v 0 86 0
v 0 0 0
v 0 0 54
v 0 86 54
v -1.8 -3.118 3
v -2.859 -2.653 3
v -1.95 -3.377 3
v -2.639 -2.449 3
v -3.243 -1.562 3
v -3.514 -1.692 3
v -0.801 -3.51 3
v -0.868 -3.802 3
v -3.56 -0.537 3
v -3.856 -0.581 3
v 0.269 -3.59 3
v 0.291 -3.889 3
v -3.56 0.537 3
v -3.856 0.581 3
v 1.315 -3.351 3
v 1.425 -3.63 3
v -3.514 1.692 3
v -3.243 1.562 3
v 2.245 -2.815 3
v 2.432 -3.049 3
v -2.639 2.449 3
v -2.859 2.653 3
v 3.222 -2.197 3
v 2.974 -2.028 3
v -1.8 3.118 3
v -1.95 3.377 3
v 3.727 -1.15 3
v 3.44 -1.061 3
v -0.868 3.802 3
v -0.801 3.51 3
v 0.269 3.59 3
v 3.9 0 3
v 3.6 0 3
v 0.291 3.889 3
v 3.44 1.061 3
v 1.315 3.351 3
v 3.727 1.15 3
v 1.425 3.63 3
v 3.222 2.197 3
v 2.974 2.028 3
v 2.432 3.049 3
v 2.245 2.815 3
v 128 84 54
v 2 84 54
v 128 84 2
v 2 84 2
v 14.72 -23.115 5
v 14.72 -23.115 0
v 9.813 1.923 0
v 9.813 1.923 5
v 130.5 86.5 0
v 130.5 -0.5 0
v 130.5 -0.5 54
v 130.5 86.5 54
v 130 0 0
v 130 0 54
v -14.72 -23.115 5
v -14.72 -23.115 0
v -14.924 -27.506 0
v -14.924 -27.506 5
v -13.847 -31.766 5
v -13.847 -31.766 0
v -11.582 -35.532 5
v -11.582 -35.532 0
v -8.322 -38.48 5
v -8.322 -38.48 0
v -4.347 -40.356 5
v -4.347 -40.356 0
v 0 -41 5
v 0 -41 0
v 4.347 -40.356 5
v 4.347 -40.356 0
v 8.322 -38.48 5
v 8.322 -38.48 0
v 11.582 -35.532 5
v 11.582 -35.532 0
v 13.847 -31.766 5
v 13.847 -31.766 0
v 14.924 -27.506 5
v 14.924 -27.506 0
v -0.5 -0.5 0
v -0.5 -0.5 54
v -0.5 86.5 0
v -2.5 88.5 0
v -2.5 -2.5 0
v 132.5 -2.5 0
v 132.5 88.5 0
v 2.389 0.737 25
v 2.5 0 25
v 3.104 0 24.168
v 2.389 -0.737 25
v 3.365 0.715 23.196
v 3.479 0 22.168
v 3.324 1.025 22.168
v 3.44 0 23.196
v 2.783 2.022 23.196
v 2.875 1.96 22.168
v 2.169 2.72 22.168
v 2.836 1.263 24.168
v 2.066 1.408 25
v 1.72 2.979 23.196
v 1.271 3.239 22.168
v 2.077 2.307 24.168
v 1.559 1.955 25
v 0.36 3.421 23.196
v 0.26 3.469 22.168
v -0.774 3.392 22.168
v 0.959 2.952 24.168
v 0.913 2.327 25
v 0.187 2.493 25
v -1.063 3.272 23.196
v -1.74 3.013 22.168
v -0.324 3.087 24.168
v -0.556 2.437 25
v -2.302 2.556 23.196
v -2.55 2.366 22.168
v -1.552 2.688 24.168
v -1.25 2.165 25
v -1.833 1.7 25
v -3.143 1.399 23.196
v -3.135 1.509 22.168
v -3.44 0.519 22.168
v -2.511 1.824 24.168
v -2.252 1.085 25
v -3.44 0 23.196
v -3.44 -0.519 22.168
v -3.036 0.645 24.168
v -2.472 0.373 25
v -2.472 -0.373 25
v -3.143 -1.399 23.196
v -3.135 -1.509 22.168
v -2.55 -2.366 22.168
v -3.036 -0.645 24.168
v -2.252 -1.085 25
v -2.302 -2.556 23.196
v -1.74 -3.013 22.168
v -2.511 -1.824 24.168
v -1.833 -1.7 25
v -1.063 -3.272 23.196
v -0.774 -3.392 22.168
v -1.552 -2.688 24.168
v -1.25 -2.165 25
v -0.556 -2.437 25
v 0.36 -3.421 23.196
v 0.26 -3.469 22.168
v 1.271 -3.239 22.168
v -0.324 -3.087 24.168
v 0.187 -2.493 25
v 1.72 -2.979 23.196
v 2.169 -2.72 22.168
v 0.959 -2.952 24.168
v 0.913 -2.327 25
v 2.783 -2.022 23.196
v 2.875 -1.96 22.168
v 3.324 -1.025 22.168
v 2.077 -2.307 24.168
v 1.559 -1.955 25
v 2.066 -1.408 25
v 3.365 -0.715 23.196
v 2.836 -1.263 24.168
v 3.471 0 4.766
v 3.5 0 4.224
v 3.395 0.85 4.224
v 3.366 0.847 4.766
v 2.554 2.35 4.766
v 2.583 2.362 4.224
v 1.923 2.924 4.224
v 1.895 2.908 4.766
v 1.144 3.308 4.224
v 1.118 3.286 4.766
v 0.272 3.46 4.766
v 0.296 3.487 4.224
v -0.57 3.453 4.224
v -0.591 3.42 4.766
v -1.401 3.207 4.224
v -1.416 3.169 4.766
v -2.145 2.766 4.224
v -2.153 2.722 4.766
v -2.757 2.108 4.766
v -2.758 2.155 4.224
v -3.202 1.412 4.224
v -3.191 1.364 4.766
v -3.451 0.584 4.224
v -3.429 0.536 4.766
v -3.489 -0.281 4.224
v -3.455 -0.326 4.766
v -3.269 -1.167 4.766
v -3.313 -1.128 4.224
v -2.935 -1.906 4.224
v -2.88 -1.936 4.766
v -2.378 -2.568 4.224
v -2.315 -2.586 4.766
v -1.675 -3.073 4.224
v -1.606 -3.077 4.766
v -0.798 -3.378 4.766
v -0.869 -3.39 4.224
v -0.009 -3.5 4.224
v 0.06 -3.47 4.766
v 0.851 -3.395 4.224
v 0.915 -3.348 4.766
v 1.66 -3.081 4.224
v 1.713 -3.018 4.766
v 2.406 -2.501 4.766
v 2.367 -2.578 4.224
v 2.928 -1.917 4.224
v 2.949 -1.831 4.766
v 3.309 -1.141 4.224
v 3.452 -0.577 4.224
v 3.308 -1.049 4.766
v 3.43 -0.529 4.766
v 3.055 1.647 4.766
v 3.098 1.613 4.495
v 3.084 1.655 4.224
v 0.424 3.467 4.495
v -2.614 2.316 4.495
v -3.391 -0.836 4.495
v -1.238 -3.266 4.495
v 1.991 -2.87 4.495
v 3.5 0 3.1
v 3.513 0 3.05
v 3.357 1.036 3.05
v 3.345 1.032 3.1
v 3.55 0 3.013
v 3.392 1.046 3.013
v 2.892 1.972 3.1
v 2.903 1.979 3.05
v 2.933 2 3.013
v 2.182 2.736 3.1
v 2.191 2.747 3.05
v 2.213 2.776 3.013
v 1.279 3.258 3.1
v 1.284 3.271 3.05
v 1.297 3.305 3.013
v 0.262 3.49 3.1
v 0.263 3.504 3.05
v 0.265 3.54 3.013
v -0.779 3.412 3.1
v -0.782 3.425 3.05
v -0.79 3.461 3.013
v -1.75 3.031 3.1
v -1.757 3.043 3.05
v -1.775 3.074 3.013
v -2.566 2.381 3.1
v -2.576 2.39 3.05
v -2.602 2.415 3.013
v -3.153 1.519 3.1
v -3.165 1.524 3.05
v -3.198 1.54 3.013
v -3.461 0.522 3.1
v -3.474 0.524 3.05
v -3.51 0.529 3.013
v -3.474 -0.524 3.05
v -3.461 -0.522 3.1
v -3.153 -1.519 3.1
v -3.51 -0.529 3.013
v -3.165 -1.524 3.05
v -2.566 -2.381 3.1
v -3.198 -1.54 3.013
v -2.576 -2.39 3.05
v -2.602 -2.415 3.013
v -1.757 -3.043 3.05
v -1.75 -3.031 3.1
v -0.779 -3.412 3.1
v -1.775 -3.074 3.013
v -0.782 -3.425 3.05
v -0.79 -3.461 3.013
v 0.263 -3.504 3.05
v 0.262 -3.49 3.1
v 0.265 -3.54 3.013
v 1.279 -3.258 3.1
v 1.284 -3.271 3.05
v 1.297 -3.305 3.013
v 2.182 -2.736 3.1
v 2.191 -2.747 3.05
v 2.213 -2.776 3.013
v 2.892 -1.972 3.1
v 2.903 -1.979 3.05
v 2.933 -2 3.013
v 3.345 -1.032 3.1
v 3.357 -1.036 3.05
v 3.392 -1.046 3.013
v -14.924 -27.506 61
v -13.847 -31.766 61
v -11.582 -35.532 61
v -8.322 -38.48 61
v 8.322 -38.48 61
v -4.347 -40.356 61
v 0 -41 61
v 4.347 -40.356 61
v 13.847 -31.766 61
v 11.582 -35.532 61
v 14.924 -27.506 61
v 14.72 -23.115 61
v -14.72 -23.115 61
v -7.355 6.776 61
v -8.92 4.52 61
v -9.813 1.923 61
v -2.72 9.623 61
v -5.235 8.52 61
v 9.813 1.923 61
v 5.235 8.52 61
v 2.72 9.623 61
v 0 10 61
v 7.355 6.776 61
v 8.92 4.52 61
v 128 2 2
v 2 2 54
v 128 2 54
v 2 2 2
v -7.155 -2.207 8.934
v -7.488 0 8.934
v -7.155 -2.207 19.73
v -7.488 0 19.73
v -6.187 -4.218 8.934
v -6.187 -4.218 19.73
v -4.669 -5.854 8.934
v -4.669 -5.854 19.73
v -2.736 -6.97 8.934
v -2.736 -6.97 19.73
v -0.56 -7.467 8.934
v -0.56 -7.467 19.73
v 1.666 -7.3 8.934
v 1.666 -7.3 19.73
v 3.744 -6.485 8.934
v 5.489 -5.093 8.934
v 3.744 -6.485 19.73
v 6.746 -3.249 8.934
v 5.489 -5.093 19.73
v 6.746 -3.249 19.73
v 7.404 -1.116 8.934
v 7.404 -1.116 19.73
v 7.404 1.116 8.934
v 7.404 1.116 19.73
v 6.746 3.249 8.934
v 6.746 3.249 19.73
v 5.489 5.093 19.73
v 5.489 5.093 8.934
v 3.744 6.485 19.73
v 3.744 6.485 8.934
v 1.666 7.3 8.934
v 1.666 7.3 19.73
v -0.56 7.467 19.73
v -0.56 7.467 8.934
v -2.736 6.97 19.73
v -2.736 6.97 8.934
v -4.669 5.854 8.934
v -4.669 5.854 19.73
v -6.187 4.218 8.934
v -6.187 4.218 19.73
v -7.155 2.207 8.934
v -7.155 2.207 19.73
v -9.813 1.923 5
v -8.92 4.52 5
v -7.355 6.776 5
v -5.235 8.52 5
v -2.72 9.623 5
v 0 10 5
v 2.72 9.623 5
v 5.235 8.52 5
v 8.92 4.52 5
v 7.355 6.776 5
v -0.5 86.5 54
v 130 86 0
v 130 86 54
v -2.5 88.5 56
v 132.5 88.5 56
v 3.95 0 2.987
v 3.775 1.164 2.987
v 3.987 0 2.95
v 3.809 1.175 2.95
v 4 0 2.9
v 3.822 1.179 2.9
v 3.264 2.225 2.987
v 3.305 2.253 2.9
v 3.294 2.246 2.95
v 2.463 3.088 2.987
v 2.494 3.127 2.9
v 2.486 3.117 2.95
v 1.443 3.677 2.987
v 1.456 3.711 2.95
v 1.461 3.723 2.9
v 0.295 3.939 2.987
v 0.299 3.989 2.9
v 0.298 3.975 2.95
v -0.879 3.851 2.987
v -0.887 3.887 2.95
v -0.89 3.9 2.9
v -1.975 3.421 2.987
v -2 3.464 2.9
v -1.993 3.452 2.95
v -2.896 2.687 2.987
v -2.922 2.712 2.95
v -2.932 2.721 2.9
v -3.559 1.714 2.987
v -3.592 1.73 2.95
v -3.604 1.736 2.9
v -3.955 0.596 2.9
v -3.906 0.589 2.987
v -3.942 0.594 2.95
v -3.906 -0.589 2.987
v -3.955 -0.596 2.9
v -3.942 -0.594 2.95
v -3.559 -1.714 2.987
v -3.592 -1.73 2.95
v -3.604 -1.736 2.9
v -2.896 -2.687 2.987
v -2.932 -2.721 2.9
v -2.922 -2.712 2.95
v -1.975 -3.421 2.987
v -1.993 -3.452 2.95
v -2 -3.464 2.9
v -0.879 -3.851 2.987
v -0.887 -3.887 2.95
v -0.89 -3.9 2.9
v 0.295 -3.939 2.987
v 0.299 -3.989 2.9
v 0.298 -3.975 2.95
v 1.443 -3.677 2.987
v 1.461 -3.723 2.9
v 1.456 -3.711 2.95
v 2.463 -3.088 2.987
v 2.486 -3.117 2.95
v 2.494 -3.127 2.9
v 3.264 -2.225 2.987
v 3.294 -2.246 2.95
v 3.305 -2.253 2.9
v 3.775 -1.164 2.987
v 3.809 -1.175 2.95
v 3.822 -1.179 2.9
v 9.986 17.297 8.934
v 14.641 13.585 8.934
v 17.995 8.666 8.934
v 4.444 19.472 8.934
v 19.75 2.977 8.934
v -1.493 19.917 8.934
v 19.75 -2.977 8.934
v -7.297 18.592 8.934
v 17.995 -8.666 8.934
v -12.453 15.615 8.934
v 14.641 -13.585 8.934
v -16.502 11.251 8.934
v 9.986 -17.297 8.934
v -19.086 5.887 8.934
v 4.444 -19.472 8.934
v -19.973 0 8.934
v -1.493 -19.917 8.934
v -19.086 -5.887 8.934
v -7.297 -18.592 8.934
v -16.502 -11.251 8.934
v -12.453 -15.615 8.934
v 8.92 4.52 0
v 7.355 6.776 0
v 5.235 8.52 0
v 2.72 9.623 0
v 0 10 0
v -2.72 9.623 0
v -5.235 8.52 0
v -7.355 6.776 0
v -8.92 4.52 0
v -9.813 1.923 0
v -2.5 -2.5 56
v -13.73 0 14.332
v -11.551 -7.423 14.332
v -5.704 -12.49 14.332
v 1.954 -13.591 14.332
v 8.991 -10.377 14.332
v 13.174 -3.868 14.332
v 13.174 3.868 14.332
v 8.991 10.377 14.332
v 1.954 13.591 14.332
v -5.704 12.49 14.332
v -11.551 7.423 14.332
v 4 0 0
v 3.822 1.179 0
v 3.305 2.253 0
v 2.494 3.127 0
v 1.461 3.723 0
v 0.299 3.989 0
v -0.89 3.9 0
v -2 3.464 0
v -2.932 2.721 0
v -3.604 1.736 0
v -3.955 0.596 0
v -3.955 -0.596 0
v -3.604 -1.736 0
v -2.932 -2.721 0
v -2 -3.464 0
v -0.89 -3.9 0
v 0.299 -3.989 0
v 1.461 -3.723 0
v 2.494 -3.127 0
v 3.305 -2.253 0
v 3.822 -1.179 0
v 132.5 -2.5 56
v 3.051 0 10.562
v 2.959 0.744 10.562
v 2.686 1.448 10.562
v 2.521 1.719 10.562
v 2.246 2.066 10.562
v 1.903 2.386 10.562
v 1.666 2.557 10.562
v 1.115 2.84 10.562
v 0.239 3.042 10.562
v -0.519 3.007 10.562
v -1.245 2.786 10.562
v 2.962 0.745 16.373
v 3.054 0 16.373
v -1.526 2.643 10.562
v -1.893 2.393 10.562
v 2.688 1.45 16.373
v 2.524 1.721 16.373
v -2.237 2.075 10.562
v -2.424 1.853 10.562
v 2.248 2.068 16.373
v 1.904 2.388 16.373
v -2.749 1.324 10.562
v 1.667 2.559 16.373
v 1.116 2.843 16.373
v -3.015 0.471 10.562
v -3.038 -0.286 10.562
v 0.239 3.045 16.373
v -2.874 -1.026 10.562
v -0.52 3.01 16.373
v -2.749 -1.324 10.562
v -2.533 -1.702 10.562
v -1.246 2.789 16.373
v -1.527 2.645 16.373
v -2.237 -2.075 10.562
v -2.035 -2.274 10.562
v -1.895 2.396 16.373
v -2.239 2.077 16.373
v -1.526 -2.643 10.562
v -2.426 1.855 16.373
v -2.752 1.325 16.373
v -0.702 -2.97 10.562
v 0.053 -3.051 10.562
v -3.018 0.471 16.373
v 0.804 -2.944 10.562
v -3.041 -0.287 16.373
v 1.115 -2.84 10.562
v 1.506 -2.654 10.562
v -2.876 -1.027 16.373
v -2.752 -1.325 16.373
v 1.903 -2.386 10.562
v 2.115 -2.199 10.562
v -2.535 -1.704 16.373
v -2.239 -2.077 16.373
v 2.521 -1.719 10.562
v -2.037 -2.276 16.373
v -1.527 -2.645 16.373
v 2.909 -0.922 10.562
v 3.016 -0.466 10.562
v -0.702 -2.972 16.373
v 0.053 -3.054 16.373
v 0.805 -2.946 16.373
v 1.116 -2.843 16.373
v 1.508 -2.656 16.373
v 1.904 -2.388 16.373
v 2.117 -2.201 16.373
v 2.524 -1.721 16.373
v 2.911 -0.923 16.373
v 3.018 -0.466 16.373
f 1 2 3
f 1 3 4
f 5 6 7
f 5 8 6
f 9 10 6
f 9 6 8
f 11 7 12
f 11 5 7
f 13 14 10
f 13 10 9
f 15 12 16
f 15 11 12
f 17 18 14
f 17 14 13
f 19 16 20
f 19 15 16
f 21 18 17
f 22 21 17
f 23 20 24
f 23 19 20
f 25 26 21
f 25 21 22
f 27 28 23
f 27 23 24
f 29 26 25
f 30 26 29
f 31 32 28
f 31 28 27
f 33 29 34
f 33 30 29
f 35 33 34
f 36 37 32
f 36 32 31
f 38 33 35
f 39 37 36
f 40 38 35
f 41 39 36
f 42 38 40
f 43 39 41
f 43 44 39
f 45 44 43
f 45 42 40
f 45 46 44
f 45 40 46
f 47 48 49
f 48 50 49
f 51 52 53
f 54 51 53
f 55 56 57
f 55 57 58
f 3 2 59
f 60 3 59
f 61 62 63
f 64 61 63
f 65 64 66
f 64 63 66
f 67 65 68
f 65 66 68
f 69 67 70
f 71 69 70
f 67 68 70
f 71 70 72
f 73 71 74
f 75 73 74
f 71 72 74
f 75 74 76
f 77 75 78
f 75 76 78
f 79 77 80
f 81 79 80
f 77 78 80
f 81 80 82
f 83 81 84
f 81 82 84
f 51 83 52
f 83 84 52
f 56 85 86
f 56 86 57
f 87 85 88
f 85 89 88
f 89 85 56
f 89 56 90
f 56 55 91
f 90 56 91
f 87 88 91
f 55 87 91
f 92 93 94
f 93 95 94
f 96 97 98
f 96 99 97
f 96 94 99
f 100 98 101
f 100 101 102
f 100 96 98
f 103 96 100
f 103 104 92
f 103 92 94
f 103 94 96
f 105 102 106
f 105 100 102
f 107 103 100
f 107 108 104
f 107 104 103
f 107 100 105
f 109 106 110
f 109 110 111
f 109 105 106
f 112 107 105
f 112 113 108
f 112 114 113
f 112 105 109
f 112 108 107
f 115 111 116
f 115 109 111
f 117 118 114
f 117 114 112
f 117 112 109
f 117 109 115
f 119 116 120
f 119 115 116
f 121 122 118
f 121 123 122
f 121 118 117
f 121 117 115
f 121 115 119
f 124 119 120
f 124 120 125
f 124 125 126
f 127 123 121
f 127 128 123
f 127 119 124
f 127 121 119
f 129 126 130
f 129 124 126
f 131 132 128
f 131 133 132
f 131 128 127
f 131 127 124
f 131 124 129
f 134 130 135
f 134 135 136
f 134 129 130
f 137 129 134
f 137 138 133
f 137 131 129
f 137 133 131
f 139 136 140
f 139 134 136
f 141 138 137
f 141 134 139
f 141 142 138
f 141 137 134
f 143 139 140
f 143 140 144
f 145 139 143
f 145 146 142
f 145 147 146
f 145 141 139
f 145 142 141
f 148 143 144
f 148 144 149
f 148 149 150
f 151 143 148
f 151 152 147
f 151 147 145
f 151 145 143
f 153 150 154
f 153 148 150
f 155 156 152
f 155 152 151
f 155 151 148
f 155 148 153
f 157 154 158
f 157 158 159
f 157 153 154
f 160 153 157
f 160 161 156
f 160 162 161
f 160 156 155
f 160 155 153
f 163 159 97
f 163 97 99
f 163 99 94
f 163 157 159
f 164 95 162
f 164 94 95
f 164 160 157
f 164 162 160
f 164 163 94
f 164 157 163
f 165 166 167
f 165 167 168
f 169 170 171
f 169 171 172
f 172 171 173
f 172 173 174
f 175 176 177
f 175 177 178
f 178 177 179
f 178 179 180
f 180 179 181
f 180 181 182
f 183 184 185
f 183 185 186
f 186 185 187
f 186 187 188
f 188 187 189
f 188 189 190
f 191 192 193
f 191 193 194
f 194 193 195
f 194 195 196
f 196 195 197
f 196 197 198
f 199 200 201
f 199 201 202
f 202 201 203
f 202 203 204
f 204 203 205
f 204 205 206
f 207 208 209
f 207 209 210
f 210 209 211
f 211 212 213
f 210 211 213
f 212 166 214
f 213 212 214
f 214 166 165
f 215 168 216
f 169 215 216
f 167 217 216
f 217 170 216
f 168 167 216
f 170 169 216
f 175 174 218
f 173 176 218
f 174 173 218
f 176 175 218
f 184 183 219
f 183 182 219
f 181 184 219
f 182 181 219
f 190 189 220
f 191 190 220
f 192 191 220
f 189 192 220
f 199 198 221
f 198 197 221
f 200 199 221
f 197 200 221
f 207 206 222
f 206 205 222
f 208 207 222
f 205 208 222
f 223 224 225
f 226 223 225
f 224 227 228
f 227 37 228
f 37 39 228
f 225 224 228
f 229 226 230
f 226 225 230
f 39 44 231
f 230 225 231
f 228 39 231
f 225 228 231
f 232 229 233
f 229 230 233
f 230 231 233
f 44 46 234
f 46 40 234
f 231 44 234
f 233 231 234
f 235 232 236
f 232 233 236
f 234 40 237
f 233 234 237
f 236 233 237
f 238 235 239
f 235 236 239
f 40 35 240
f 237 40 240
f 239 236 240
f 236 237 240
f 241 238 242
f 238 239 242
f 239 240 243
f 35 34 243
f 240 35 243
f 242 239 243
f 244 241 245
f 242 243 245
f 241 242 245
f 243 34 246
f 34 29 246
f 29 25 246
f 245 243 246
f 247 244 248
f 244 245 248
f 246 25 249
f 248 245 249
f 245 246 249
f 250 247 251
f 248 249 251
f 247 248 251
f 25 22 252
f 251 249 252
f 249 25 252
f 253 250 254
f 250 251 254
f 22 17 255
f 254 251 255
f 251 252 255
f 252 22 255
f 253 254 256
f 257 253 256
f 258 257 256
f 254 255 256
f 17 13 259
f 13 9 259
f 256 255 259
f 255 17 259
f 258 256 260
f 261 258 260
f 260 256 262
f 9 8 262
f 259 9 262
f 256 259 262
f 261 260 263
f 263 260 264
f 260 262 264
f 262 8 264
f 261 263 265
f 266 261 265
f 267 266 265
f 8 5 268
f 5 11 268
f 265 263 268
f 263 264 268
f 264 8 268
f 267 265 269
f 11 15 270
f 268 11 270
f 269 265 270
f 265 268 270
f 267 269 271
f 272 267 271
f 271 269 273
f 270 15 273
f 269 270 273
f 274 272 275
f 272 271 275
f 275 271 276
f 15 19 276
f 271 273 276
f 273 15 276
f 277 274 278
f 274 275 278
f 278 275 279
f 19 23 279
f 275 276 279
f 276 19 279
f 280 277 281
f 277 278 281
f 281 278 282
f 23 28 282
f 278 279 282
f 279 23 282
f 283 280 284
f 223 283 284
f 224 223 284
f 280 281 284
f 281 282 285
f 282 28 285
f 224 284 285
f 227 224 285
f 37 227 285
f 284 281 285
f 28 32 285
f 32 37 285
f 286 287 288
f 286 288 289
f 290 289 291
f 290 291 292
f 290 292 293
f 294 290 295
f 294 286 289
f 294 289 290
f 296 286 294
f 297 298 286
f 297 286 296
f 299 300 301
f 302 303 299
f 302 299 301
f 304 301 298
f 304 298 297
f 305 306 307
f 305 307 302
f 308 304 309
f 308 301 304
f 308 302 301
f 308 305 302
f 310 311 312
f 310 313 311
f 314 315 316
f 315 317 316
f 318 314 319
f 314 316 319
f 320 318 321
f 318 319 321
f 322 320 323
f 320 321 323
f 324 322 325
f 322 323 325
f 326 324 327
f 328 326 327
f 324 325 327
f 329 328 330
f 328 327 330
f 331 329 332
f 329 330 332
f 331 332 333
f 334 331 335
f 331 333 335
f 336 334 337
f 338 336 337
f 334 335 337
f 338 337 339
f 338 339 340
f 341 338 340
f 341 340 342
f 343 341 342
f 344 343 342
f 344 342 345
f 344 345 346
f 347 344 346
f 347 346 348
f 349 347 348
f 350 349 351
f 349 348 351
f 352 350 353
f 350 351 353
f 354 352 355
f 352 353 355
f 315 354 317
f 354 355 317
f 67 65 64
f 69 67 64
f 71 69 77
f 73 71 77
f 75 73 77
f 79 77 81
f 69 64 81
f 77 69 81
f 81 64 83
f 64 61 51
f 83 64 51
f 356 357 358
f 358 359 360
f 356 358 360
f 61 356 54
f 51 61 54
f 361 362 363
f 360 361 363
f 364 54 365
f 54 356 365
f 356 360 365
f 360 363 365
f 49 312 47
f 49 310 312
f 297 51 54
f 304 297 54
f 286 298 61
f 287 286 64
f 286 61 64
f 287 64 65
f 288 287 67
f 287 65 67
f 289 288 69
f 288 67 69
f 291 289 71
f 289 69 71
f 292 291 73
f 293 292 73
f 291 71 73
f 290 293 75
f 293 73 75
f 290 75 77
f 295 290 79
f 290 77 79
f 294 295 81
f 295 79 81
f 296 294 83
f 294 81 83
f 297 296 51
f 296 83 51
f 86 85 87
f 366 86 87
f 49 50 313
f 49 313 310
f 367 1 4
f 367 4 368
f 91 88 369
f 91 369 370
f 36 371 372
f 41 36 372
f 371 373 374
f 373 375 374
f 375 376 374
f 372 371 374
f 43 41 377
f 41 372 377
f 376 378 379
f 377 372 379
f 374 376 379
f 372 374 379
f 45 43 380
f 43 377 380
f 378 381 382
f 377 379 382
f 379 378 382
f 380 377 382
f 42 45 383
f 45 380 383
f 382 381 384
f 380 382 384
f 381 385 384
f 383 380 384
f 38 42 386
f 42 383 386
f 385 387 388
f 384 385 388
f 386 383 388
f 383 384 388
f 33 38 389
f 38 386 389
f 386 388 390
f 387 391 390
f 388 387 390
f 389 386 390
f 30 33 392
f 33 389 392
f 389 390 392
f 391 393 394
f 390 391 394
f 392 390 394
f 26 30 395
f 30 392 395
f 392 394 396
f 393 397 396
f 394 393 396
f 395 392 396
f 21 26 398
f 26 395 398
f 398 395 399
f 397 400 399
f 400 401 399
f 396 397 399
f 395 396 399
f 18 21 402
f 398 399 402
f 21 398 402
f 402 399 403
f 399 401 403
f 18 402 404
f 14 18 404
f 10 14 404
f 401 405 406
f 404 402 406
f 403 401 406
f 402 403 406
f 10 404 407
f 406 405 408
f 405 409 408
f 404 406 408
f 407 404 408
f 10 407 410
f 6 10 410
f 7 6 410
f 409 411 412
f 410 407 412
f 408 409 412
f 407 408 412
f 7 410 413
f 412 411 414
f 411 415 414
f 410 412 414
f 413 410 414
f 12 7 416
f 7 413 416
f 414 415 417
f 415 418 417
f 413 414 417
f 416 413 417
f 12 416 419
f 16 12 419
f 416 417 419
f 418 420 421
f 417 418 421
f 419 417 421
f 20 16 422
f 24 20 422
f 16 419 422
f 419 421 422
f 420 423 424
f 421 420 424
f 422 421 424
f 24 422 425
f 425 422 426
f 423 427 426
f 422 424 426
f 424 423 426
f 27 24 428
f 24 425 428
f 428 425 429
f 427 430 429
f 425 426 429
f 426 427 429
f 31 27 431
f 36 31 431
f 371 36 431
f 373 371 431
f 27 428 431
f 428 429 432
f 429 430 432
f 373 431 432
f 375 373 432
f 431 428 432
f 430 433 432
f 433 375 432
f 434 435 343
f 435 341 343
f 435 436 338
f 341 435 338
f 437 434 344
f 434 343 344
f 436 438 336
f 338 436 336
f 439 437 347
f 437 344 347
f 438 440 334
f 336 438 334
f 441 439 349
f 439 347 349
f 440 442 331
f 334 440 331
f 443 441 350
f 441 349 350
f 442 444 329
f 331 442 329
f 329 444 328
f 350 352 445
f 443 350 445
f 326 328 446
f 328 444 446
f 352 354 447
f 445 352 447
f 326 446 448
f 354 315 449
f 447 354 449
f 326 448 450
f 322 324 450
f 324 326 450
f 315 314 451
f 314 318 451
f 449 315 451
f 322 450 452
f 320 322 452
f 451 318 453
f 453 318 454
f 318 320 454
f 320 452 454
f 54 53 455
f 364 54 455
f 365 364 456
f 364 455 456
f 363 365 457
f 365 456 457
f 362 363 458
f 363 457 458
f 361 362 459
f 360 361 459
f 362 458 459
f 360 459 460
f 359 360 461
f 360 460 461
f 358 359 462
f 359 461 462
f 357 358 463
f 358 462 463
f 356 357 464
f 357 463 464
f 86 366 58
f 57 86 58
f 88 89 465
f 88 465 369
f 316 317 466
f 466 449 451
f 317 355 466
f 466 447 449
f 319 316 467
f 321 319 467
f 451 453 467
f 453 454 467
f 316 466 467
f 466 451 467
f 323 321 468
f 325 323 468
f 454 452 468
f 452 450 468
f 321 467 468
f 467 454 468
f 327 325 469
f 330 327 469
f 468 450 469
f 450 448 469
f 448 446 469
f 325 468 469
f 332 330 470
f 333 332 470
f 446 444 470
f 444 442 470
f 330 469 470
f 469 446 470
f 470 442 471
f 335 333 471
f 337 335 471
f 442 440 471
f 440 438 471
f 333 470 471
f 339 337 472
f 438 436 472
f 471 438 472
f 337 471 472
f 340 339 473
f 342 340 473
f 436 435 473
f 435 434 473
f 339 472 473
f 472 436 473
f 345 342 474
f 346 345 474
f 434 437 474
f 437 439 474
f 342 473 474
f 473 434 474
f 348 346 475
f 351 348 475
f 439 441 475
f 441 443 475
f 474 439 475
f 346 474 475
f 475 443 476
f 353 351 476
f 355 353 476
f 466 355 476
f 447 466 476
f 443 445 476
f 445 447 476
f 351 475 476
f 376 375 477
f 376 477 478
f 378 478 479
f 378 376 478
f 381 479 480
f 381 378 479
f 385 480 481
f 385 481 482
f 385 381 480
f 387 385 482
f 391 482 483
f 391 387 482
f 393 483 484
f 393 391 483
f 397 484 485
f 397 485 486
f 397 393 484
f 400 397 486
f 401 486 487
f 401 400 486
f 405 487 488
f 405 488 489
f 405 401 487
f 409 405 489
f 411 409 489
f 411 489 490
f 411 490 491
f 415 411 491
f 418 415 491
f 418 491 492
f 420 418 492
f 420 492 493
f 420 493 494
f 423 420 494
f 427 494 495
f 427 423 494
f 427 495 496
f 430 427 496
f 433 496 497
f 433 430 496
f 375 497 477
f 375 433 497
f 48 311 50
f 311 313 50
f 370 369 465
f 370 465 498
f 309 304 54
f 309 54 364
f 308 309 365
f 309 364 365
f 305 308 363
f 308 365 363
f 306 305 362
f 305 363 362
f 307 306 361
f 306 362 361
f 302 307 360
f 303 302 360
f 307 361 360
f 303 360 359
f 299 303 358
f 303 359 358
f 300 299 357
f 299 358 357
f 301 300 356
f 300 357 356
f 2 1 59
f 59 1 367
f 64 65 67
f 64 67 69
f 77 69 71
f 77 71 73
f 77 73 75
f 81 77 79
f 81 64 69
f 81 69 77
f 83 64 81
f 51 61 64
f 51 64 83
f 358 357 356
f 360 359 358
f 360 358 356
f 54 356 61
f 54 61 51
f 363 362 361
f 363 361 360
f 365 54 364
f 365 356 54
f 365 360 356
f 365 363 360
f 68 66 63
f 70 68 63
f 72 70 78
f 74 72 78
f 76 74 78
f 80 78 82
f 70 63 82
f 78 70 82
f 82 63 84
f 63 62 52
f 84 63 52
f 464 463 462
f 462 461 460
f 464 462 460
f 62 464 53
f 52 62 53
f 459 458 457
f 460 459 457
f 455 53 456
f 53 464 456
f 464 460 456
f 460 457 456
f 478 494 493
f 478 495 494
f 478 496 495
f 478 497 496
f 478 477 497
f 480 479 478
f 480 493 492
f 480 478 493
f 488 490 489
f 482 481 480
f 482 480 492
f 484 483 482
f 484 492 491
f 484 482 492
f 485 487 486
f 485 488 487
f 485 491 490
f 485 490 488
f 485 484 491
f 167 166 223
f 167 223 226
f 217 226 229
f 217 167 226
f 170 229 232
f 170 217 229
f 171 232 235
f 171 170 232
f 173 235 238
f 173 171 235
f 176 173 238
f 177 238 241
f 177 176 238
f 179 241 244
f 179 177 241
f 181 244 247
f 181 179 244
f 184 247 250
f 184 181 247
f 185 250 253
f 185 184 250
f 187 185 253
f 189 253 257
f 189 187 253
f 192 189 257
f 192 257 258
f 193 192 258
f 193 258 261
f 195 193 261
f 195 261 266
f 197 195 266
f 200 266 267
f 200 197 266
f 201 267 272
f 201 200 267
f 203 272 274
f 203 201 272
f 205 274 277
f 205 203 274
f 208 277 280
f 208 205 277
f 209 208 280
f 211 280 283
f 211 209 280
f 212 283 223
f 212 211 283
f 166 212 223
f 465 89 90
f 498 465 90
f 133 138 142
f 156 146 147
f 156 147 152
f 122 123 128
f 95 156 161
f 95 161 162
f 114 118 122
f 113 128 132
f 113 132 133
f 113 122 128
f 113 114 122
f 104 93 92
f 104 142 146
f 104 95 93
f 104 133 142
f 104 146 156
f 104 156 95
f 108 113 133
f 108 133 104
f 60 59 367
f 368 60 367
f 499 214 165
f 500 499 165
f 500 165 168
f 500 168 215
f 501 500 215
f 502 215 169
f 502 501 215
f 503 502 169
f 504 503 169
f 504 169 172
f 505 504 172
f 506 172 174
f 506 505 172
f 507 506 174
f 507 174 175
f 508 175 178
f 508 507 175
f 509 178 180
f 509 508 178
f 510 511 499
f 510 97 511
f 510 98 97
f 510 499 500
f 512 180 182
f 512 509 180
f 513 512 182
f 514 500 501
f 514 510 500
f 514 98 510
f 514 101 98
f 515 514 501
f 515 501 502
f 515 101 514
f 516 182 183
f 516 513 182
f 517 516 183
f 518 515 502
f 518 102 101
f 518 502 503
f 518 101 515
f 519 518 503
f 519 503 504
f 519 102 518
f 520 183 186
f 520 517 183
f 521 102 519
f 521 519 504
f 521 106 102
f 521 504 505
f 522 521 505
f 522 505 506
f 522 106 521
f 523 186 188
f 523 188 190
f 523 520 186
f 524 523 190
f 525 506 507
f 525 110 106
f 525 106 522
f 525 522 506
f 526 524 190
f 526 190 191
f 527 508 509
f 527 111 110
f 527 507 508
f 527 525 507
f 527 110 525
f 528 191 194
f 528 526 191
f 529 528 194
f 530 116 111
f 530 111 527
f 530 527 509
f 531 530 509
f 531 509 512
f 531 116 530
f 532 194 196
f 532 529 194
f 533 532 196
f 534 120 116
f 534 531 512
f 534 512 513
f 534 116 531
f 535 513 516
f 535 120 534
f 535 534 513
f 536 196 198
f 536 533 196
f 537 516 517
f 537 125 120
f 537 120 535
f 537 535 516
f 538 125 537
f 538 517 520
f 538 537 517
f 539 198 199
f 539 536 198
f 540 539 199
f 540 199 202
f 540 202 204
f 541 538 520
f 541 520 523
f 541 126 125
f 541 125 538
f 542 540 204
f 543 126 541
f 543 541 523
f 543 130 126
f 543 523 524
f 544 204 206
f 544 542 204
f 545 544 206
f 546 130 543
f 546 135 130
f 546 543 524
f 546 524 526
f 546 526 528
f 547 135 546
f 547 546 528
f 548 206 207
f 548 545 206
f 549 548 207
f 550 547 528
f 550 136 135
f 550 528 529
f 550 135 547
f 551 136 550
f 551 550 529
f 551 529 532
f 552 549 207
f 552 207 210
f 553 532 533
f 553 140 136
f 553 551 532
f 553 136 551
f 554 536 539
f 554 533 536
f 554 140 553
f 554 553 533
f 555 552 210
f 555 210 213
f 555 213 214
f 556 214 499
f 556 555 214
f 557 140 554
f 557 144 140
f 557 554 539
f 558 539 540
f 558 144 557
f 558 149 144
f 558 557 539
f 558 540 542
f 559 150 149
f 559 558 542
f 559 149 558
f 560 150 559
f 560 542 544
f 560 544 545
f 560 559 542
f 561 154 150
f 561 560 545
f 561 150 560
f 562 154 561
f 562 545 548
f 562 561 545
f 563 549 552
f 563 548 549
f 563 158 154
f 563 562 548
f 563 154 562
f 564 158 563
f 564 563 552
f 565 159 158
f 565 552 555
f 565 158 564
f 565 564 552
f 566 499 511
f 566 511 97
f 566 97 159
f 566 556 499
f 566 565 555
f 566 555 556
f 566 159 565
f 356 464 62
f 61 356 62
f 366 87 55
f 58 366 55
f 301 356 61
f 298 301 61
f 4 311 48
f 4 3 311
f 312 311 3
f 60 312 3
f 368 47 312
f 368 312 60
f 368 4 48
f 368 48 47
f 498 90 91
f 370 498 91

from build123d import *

# Parameters (mm, degrees)
F0_W     = 130
F0_H     = 86
F1_DEPTH = 54
F2_T     = -2
F3_W     = 135
F3_H     = 91
F4_DEPTH = 56
F5_T     = -2
F7_DEPTH = 5
F8_START = 5
F8_DEPTH = 56
F11_R    = 5
F12_R    = 0.1


with BuildPart() as f1:
    # F0 (on Top) → F1 (new body)
    with BuildSketch(Plane.XY):
        with Locations((65, 43)):
            Rectangle(F0_W, F0_H)
    extrude(amount=F1_DEPTH)

    # F2
    f2_openings = [f1.faces().sort_by_distance(p)[0] for p in [
        (65, 43, 54),
    ]]
    offset(amount=F2_T, openings=f2_openings)


with BuildPart() as f4:
    # F3 (on Top) → F4 (new body, through all)
    with BuildSketch(Plane.XY):
        with Locations((65, 43)):
            Rectangle(F3_W, F3_H)
    extrude(amount=F4_DEPTH)

    # F5
    f5_openings = [f4.faces().sort_by_distance(p)[0] for p in [
        (65, 43, 0),
    ]]
    offset(amount=F5_T, openings=f5_openings)


with BuildPart() as f7:
    # F6 (on Top) → F7 (new body)
    with BuildSketch(Plane.XY):
        with BuildLine():
            Line((14.7200201794, -23.1153846154), (9.8133467863, 1.9230769231))
            ThreePointArc((9.8133467863, 1.9230769231), (0, 10), (-9.8133467863, 1.9230769231))
            Line((-9.8133467863, 1.9230769231), (-14.7200201794, -23.1153846154))
            ThreePointArc((-14.7200201794, -23.1153846154), (0, -41), (14.7200201794, -23.1153846154))
        make_face()
    extrude(amount=F7_DEPTH)


with BuildPart() as f8:
    # F6 (on Top) → F8 (new body)
    with BuildSketch(Plane.XY.offset(F8_START)):
        with BuildLine():
            Line((14.7200201794, -23.1153846154), (9.8133467863, 1.9230769231))
            ThreePointArc((9.8133467863, 1.9230769231), (0, 10), (-9.8133467863, 1.9230769231))
            Line((-9.8133467863, 1.9230769231), (-14.7200201794, -23.1153846154))
            ThreePointArc((-14.7200201794, -23.1153846154), (0, -41), (14.7200201794, -23.1153846154))
        make_face()
    extrude(amount=F8_DEPTH)


with BuildPart() as f10:
    # F9 (on Front) → F10 (revolve)
    with BuildSketch(Plane.XZ):
        with BuildLine():
            Line((0, 25), (0, 0))
            Line((0, 0), (4, 0))
            Line((4, 0), (4, 3))
            Line((4, 3), (3.5, 3))
            Line((3.5, 3), (3.5, 4.5))
            ThreePointArc((3.5, 4.5), (3.0000563073, 13.3334093128), (3.4790330346, 22.1679803312))
            ThreePointArc((3.4790330346, 22.1679803312), (3.3079136715, 23.694060493), (2.5, 25))
            Line((2.5, 25), (0, 25))
        make_face()
    revolve(axis=Axis((0, 0, 15.574289132), (0, 0, 1)))

    # F11
    f11_edges = [f10.edges().sort_by_distance(p)[0] for p in [
        (-3.5, 0, 4.5),
    ]]
    fillet(f11_edges, radius=F11_R)

    # F12
    f12_edges = [f10.edges().sort_by_distance(p)[0] for p in [
        (-3.5, 0, 3),
        (-4, 0, 3),
    ]]
    fillet(f12_edges, radius=F12_R)


with BuildPart() as f13:
    # F9 (on Front) → F13 (revolve)
    with BuildSketch(Plane.XZ):
        Polygon((-7.4878484011, 19.7298005223), (-19.9729353189, 8.9338691905), (-7.4878484011, 8.9338691905), align=None)
    revolve(axis=Axis((0, 0, 15.574289132), (0, 0, 1)))


solid = Compound([f1.part, f4.part, f7.part, f8.part, f10.part, f13.part])
